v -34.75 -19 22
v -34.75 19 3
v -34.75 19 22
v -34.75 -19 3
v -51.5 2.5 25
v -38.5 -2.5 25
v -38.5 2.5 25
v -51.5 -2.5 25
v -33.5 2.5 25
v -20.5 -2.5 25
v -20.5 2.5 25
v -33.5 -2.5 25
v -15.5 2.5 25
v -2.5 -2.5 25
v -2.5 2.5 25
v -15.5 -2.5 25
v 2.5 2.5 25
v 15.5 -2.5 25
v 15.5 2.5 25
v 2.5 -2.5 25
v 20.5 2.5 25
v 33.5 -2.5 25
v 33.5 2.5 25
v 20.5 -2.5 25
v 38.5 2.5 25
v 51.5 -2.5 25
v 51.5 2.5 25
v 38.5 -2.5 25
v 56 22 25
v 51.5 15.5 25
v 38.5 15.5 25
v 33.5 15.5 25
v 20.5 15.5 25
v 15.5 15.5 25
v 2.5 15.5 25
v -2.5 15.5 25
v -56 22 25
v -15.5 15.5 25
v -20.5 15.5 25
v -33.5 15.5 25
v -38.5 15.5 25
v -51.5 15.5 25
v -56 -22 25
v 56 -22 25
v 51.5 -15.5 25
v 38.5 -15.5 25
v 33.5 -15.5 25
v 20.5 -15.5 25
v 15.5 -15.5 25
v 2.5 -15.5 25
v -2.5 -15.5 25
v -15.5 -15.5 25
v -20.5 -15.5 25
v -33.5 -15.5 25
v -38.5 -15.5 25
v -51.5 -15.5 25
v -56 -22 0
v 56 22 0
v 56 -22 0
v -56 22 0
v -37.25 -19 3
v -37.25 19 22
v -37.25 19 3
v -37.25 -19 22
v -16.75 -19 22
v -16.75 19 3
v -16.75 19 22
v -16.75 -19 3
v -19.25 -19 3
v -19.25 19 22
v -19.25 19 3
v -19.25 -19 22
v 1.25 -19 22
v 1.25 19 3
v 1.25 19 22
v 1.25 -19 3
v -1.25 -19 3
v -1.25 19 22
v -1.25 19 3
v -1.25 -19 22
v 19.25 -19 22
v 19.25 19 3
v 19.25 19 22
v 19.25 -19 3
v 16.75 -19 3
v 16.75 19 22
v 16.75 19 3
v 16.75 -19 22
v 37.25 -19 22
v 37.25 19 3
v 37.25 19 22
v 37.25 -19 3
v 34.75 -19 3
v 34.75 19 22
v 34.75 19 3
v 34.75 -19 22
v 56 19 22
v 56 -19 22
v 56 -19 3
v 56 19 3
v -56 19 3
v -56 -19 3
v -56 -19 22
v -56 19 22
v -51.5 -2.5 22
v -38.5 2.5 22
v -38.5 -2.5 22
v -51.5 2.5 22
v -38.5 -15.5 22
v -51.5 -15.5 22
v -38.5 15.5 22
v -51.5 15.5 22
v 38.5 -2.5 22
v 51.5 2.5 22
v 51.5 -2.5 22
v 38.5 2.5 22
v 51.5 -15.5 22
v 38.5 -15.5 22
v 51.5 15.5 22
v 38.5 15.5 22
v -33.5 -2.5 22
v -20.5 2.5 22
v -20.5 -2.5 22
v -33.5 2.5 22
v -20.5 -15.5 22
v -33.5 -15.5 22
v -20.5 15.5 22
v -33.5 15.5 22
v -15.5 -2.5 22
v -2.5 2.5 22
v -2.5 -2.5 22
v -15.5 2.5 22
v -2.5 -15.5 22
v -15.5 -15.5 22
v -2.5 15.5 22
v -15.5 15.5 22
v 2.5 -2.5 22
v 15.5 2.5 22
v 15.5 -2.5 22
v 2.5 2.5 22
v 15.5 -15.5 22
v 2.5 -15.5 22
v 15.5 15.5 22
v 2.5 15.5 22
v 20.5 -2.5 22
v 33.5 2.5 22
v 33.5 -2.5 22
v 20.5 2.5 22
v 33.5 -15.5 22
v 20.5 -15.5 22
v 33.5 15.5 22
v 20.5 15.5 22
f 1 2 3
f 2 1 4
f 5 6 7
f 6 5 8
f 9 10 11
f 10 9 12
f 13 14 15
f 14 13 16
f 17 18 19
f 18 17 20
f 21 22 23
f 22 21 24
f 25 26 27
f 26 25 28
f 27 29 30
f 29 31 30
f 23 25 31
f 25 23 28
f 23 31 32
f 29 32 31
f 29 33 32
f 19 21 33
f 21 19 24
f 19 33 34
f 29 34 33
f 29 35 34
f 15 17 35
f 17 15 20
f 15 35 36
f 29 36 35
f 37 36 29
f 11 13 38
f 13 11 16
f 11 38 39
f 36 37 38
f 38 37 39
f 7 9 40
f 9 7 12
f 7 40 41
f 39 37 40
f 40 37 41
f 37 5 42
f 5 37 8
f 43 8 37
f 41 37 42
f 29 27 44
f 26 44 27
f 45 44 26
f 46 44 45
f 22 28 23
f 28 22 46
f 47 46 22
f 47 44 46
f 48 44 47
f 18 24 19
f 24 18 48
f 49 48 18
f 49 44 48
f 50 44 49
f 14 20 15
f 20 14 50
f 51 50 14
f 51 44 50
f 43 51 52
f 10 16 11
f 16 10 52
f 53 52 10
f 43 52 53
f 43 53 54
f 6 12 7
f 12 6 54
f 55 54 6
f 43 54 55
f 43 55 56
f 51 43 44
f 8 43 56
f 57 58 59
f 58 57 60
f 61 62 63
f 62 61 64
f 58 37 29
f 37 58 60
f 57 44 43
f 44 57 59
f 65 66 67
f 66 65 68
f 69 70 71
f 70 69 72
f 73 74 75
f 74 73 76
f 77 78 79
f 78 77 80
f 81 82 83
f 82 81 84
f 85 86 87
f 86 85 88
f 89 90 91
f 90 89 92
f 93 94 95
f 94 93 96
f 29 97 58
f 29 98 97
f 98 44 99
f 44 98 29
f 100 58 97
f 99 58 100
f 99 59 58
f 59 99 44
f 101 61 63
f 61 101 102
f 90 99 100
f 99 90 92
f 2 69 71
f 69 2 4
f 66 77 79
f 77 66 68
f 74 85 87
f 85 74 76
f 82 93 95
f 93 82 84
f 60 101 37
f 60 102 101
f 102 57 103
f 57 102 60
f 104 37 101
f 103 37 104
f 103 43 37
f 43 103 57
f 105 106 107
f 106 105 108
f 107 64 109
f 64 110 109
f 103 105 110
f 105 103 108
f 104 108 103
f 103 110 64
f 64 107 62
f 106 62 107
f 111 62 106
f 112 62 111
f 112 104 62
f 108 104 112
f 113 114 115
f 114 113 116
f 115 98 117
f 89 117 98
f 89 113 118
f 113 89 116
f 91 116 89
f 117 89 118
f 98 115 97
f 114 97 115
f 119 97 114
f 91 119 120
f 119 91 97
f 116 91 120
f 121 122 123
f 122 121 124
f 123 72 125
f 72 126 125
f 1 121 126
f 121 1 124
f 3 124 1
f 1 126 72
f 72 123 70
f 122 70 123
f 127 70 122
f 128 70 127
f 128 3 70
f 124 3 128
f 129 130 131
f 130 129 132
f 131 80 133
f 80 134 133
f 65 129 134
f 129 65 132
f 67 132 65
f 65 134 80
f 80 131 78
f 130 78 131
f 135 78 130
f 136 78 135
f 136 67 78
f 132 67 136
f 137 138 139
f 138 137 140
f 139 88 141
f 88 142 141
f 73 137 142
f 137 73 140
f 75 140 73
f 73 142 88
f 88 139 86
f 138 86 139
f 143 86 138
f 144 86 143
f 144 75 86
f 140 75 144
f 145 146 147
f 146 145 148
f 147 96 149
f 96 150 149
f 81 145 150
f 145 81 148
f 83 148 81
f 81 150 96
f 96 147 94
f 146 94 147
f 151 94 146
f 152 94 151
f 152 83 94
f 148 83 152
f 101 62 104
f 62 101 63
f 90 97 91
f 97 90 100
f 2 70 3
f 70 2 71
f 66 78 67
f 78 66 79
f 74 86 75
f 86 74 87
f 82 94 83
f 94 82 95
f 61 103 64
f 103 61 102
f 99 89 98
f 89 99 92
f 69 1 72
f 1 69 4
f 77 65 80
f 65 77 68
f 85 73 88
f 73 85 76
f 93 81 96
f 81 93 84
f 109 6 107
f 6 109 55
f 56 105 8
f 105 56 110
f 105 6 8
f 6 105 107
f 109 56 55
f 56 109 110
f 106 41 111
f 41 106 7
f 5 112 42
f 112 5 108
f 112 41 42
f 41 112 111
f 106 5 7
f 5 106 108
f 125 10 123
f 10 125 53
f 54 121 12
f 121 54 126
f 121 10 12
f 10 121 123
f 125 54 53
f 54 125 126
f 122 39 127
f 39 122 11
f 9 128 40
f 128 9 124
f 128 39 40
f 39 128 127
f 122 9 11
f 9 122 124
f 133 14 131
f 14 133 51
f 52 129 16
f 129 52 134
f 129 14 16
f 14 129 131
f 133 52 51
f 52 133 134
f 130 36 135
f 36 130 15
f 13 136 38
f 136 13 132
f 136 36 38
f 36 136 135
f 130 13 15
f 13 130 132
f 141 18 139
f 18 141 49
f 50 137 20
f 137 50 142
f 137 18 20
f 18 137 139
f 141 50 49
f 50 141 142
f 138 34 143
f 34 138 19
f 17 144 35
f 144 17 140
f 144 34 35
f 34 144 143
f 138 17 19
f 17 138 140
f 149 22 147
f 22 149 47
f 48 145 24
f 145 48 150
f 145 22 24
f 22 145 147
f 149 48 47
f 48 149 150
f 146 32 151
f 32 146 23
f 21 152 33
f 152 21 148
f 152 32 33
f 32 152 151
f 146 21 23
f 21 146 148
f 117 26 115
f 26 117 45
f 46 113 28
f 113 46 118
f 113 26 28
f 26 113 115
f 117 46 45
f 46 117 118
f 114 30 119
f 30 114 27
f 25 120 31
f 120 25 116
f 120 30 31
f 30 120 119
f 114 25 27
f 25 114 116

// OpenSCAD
// Cuvette Rack - 12 slots (2 rows × 6 columns)
// Dimensions in millimeters

// Base and deck dimensions
base_x = 112;           // Base plate width (X)
base_y = 44;            // Base plate depth (Y)
base_z = 3;             // Base plate thickness
deck_z = 3;             // Deck plate thickness
deck_bottom_z = 22;     // Deck bottom position (z)
deck_top_z = 25;        // Deck top position (z)

// Wall dimensions
wall_height = 25;       // Height from bottom to top
end_wall_thick = 3;     // Thickness of end walls (Y direction)
rib_thick = 2.5;        // Thickness of ribs (X direction)

// Rib positions (X coordinates)
rib_x_positions = [-36, -18, 0, 18, 36];

// Hole dimensions and spacing
hole_size = 13;         // Square hole side length (mm)
hole_spacing_x = 18;    // X spacing between hole centers
hole_spacing_y = 18;    // Y spacing between hole centers

// Set resolution for curved shapes
$fn = 64;

difference() {
    // Positive geometry: base, deck, and walls
    union() {
        // Base plate (z = 0 to 3)
        translate([-base_x/2, -base_y/2, 0])
            cube([base_x, base_y, base_z]);
        
        // Deck plate (z = 22 to 25)
        translate([-base_x/2, -base_y/2, deck_bottom_z])
            cube([base_x, base_y, deck_z]);
        
        // Back end wall (at y = 22, 3 mm thick, extends inward to y = 19)
        translate([-base_x/2, base_y/2 - end_wall_thick, 0])
            cube([base_x, end_wall_thick, wall_height]);
        
        // Front end wall (at y = -22, 3 mm thick, extends inward to y = -19)
        translate([-base_x/2, -base_y/2, 0])
            cube([base_x, end_wall_thick, wall_height]);
        
        // Five vertical ribs (2.5 mm thick each)
        for (x = rib_x_positions) {
            translate([x - rib_thick/2, -base_y/2, 0])
                cube([rib_thick, base_y, wall_height]);
        }
    }
    
    // Negative geometry: through-holes in deck plate
    // 2 rows (Y) × 6 columns (X) of 13 × 13 mm square holes
    // 18 mm center-to-center spacing, centered on deck
    for (i = [0:5]) {
        for (j = [0:1]) {
            x = -45 + i * hole_spacing_x;    // X positions: -45, -27, -9, 9, 27, 45
            y = -9 + j * hole_spacing_y;     // Y positions: -9, 9
            // Cutting box extends beyond deck to ensure clean holes
            translate([x - hole_size/2, y - hole_size/2, deck_bottom_z - 0.5])
                cube([hole_size, hole_size, deck_top_z - deck_bottom_z + 1]);
        }
    }
}
